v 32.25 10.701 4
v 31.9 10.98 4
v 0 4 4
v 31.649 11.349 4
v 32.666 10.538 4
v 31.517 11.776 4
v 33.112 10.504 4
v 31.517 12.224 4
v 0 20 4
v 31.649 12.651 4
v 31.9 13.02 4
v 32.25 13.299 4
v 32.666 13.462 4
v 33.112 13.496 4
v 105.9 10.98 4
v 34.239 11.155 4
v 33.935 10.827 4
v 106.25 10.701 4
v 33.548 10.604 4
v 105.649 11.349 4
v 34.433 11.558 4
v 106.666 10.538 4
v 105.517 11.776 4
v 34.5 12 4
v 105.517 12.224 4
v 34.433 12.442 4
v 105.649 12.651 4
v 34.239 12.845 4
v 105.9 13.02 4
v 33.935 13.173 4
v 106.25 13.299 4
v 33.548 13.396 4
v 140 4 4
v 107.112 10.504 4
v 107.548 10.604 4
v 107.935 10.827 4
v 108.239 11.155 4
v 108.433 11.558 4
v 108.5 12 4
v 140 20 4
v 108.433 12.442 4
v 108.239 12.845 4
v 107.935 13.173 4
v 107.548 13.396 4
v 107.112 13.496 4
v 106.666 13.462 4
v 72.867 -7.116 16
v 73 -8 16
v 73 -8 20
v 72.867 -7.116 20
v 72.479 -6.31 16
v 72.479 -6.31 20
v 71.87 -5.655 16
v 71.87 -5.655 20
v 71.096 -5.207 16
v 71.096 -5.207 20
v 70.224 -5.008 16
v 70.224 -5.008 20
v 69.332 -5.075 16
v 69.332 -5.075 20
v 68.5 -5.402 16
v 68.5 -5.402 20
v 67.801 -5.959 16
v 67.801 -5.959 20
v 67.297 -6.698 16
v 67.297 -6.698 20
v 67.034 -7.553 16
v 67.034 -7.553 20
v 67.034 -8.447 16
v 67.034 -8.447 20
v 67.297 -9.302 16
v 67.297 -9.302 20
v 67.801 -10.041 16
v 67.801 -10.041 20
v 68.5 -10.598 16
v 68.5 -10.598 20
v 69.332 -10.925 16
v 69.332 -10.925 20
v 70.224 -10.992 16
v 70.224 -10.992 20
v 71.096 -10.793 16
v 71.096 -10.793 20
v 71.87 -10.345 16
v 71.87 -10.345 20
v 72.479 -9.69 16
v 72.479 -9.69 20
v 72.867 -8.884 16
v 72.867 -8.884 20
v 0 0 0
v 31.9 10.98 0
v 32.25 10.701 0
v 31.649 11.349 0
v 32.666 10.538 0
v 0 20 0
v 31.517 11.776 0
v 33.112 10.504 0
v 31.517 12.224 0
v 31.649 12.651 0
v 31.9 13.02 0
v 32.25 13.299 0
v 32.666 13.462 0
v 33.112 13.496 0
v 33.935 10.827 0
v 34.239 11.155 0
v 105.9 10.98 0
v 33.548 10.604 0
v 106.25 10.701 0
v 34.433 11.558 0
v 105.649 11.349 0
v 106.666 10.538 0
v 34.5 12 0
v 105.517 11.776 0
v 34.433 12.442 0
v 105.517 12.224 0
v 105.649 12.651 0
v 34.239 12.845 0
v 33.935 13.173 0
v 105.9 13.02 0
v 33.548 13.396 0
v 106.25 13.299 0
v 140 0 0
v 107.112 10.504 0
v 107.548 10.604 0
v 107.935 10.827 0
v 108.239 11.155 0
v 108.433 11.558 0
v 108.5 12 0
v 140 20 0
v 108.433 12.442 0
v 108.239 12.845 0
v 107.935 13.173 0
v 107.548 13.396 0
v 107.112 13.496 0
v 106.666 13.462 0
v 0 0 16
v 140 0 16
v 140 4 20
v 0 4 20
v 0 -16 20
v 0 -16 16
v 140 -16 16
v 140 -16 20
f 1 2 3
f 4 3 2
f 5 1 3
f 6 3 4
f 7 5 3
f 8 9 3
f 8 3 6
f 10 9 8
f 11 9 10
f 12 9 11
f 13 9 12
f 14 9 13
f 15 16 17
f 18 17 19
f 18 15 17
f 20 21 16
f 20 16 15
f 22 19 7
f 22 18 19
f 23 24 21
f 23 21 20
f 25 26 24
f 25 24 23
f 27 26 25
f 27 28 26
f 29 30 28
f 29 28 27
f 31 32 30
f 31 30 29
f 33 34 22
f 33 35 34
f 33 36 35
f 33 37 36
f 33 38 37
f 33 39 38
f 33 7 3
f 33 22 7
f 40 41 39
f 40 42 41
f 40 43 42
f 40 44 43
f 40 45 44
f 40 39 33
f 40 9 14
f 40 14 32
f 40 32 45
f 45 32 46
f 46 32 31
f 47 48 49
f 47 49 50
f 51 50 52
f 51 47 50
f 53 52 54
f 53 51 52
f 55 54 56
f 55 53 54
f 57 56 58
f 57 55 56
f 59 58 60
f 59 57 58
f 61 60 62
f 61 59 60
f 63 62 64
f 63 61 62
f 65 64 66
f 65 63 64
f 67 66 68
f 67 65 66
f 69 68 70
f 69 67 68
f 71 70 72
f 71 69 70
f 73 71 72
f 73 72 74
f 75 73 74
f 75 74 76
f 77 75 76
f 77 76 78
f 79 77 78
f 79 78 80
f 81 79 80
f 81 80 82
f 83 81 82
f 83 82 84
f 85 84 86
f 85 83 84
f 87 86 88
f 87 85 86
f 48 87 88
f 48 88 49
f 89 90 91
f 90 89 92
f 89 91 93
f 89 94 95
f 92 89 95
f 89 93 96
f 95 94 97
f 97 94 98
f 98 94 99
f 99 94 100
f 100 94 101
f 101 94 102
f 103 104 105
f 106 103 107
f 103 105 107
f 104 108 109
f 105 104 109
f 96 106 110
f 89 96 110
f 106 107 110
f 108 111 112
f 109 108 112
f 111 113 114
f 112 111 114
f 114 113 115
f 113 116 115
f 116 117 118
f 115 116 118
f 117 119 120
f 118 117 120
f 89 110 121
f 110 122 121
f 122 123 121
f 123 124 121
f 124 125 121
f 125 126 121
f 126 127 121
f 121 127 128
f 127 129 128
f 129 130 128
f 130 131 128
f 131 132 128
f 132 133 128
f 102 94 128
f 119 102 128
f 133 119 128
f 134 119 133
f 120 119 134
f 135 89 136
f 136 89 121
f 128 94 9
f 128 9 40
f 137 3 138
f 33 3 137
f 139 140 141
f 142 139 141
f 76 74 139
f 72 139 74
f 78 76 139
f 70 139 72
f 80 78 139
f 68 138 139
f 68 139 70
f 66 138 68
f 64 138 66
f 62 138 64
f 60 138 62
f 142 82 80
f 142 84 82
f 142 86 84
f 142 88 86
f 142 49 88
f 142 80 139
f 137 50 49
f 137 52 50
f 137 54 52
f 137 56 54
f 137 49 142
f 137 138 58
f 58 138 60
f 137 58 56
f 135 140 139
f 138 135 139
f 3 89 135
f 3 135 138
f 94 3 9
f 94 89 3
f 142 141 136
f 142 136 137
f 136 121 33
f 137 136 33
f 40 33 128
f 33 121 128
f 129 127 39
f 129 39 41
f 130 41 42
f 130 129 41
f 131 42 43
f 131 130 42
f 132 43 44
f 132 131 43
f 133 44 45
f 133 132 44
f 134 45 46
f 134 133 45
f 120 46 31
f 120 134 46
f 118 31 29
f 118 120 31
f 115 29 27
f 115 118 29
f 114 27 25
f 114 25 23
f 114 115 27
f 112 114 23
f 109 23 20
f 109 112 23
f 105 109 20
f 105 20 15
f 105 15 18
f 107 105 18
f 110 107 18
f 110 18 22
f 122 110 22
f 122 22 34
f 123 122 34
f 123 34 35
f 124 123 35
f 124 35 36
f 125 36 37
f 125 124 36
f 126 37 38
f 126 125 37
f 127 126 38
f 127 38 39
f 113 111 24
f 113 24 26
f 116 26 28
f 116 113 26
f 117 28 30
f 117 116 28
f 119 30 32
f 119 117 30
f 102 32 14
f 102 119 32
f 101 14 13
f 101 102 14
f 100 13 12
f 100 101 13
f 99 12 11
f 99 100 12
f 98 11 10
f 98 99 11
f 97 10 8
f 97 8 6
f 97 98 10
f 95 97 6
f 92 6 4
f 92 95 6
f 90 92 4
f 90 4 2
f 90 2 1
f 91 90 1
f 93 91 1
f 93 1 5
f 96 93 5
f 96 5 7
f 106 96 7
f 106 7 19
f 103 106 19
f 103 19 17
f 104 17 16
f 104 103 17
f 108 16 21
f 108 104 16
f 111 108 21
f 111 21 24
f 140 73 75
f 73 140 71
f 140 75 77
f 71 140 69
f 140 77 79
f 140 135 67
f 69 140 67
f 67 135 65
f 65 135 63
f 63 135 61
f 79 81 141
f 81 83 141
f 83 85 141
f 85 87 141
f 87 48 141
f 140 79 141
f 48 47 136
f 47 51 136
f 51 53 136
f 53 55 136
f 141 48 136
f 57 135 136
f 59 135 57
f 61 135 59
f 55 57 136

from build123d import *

# Parameters (mm, degrees)
CYLINDER_R        = 1.5
CYLINDER_DEPTH    = 4
CYLINDER002_R     = 3
CYLINDER002_DEPTH = 4
CYLINDER001_R     = 1.5
CYLINDER001_DEPTH = 4
BOX001_W          = 140
BOX001_H          = 20
BOX001_DEPTH      = 4
BOX002_W          = 140
BOX002_H          = 20
BOX002_DEPTH      = 4
BOX_W             = 140
BOX_H             = 4
BOX_DEPTH         = 20


with BuildPart() as agujero_de_metrica_3_trasero:
    # Cylinder → Cylinder (new body)
    with BuildSketch(Plane(origin=(33, 12, 0), x_dir=(1, 0, 0), z_dir=(0, 0, 1))):
        Circle(CYLINDER_R)
    extrude(amount=CYLINDER_DEPTH)


with BuildPart() as cylinder002:
    # Cylinder002 → Cylinder002 (new body)
    with BuildSketch(Plane(origin=(70, -8, 16), x_dir=(1, 0, 0), z_dir=(0, 0, 1))):
        Circle(CYLINDER002_R)
    extrude(amount=CYLINDER002_DEPTH)


with BuildPart() as perforaciones:
    # Cylinder001 → Cylinder001 (new body)
    with BuildSketch(Plane(origin=(107, 12, 0), x_dir=(1, 0, 0), z_dir=(0, 0, 1))):
        Circle(CYLINDER001_R)
    extrude(amount=CYLINDER001_DEPTH)

    # Fusion001: union Agujero de metrica 3 trasero, Cylinder002
    add(agujero_de_metrica_3_trasero.part)
    add(cylinder002.part)


with BuildPart() as perfil_inferior:
    # Box001 → Box001 (new body)
    with BuildSketch(Plane.XY):
        with Locations((70, 10)):
            Rectangle(BOX001_W, BOX001_H)
    extrude(amount=BOX001_DEPTH)


with BuildPart() as perfil_superior:
    # Box002 → Box002 (new body)
    with BuildSketch(Plane(origin=(0, -16, 16), x_dir=(1, 0, 0), z_dir=(0, 0, 1))):
        with Locations((70, 10)):
            Rectangle(BOX002_W, BOX002_H)
    extrude(amount=BOX002_DEPTH)


with BuildPart() as perfil_derecho:
    # Box → Box (new body)
    with BuildSketch(Plane.XY):
        with Locations((70, 2)):
            Rectangle(BOX_W, BOX_H)
    extrude(amount=BOX_DEPTH)

    # Fusion: union Perfil inferior, Perfil superior
    add(perfil_inferior.part)
    add(perfil_superior.part)

    # Cut: cut Perforaciones
    add(perforaciones.part, mode=Mode.SUBTRACT)


solid = perfil_derecho.part
